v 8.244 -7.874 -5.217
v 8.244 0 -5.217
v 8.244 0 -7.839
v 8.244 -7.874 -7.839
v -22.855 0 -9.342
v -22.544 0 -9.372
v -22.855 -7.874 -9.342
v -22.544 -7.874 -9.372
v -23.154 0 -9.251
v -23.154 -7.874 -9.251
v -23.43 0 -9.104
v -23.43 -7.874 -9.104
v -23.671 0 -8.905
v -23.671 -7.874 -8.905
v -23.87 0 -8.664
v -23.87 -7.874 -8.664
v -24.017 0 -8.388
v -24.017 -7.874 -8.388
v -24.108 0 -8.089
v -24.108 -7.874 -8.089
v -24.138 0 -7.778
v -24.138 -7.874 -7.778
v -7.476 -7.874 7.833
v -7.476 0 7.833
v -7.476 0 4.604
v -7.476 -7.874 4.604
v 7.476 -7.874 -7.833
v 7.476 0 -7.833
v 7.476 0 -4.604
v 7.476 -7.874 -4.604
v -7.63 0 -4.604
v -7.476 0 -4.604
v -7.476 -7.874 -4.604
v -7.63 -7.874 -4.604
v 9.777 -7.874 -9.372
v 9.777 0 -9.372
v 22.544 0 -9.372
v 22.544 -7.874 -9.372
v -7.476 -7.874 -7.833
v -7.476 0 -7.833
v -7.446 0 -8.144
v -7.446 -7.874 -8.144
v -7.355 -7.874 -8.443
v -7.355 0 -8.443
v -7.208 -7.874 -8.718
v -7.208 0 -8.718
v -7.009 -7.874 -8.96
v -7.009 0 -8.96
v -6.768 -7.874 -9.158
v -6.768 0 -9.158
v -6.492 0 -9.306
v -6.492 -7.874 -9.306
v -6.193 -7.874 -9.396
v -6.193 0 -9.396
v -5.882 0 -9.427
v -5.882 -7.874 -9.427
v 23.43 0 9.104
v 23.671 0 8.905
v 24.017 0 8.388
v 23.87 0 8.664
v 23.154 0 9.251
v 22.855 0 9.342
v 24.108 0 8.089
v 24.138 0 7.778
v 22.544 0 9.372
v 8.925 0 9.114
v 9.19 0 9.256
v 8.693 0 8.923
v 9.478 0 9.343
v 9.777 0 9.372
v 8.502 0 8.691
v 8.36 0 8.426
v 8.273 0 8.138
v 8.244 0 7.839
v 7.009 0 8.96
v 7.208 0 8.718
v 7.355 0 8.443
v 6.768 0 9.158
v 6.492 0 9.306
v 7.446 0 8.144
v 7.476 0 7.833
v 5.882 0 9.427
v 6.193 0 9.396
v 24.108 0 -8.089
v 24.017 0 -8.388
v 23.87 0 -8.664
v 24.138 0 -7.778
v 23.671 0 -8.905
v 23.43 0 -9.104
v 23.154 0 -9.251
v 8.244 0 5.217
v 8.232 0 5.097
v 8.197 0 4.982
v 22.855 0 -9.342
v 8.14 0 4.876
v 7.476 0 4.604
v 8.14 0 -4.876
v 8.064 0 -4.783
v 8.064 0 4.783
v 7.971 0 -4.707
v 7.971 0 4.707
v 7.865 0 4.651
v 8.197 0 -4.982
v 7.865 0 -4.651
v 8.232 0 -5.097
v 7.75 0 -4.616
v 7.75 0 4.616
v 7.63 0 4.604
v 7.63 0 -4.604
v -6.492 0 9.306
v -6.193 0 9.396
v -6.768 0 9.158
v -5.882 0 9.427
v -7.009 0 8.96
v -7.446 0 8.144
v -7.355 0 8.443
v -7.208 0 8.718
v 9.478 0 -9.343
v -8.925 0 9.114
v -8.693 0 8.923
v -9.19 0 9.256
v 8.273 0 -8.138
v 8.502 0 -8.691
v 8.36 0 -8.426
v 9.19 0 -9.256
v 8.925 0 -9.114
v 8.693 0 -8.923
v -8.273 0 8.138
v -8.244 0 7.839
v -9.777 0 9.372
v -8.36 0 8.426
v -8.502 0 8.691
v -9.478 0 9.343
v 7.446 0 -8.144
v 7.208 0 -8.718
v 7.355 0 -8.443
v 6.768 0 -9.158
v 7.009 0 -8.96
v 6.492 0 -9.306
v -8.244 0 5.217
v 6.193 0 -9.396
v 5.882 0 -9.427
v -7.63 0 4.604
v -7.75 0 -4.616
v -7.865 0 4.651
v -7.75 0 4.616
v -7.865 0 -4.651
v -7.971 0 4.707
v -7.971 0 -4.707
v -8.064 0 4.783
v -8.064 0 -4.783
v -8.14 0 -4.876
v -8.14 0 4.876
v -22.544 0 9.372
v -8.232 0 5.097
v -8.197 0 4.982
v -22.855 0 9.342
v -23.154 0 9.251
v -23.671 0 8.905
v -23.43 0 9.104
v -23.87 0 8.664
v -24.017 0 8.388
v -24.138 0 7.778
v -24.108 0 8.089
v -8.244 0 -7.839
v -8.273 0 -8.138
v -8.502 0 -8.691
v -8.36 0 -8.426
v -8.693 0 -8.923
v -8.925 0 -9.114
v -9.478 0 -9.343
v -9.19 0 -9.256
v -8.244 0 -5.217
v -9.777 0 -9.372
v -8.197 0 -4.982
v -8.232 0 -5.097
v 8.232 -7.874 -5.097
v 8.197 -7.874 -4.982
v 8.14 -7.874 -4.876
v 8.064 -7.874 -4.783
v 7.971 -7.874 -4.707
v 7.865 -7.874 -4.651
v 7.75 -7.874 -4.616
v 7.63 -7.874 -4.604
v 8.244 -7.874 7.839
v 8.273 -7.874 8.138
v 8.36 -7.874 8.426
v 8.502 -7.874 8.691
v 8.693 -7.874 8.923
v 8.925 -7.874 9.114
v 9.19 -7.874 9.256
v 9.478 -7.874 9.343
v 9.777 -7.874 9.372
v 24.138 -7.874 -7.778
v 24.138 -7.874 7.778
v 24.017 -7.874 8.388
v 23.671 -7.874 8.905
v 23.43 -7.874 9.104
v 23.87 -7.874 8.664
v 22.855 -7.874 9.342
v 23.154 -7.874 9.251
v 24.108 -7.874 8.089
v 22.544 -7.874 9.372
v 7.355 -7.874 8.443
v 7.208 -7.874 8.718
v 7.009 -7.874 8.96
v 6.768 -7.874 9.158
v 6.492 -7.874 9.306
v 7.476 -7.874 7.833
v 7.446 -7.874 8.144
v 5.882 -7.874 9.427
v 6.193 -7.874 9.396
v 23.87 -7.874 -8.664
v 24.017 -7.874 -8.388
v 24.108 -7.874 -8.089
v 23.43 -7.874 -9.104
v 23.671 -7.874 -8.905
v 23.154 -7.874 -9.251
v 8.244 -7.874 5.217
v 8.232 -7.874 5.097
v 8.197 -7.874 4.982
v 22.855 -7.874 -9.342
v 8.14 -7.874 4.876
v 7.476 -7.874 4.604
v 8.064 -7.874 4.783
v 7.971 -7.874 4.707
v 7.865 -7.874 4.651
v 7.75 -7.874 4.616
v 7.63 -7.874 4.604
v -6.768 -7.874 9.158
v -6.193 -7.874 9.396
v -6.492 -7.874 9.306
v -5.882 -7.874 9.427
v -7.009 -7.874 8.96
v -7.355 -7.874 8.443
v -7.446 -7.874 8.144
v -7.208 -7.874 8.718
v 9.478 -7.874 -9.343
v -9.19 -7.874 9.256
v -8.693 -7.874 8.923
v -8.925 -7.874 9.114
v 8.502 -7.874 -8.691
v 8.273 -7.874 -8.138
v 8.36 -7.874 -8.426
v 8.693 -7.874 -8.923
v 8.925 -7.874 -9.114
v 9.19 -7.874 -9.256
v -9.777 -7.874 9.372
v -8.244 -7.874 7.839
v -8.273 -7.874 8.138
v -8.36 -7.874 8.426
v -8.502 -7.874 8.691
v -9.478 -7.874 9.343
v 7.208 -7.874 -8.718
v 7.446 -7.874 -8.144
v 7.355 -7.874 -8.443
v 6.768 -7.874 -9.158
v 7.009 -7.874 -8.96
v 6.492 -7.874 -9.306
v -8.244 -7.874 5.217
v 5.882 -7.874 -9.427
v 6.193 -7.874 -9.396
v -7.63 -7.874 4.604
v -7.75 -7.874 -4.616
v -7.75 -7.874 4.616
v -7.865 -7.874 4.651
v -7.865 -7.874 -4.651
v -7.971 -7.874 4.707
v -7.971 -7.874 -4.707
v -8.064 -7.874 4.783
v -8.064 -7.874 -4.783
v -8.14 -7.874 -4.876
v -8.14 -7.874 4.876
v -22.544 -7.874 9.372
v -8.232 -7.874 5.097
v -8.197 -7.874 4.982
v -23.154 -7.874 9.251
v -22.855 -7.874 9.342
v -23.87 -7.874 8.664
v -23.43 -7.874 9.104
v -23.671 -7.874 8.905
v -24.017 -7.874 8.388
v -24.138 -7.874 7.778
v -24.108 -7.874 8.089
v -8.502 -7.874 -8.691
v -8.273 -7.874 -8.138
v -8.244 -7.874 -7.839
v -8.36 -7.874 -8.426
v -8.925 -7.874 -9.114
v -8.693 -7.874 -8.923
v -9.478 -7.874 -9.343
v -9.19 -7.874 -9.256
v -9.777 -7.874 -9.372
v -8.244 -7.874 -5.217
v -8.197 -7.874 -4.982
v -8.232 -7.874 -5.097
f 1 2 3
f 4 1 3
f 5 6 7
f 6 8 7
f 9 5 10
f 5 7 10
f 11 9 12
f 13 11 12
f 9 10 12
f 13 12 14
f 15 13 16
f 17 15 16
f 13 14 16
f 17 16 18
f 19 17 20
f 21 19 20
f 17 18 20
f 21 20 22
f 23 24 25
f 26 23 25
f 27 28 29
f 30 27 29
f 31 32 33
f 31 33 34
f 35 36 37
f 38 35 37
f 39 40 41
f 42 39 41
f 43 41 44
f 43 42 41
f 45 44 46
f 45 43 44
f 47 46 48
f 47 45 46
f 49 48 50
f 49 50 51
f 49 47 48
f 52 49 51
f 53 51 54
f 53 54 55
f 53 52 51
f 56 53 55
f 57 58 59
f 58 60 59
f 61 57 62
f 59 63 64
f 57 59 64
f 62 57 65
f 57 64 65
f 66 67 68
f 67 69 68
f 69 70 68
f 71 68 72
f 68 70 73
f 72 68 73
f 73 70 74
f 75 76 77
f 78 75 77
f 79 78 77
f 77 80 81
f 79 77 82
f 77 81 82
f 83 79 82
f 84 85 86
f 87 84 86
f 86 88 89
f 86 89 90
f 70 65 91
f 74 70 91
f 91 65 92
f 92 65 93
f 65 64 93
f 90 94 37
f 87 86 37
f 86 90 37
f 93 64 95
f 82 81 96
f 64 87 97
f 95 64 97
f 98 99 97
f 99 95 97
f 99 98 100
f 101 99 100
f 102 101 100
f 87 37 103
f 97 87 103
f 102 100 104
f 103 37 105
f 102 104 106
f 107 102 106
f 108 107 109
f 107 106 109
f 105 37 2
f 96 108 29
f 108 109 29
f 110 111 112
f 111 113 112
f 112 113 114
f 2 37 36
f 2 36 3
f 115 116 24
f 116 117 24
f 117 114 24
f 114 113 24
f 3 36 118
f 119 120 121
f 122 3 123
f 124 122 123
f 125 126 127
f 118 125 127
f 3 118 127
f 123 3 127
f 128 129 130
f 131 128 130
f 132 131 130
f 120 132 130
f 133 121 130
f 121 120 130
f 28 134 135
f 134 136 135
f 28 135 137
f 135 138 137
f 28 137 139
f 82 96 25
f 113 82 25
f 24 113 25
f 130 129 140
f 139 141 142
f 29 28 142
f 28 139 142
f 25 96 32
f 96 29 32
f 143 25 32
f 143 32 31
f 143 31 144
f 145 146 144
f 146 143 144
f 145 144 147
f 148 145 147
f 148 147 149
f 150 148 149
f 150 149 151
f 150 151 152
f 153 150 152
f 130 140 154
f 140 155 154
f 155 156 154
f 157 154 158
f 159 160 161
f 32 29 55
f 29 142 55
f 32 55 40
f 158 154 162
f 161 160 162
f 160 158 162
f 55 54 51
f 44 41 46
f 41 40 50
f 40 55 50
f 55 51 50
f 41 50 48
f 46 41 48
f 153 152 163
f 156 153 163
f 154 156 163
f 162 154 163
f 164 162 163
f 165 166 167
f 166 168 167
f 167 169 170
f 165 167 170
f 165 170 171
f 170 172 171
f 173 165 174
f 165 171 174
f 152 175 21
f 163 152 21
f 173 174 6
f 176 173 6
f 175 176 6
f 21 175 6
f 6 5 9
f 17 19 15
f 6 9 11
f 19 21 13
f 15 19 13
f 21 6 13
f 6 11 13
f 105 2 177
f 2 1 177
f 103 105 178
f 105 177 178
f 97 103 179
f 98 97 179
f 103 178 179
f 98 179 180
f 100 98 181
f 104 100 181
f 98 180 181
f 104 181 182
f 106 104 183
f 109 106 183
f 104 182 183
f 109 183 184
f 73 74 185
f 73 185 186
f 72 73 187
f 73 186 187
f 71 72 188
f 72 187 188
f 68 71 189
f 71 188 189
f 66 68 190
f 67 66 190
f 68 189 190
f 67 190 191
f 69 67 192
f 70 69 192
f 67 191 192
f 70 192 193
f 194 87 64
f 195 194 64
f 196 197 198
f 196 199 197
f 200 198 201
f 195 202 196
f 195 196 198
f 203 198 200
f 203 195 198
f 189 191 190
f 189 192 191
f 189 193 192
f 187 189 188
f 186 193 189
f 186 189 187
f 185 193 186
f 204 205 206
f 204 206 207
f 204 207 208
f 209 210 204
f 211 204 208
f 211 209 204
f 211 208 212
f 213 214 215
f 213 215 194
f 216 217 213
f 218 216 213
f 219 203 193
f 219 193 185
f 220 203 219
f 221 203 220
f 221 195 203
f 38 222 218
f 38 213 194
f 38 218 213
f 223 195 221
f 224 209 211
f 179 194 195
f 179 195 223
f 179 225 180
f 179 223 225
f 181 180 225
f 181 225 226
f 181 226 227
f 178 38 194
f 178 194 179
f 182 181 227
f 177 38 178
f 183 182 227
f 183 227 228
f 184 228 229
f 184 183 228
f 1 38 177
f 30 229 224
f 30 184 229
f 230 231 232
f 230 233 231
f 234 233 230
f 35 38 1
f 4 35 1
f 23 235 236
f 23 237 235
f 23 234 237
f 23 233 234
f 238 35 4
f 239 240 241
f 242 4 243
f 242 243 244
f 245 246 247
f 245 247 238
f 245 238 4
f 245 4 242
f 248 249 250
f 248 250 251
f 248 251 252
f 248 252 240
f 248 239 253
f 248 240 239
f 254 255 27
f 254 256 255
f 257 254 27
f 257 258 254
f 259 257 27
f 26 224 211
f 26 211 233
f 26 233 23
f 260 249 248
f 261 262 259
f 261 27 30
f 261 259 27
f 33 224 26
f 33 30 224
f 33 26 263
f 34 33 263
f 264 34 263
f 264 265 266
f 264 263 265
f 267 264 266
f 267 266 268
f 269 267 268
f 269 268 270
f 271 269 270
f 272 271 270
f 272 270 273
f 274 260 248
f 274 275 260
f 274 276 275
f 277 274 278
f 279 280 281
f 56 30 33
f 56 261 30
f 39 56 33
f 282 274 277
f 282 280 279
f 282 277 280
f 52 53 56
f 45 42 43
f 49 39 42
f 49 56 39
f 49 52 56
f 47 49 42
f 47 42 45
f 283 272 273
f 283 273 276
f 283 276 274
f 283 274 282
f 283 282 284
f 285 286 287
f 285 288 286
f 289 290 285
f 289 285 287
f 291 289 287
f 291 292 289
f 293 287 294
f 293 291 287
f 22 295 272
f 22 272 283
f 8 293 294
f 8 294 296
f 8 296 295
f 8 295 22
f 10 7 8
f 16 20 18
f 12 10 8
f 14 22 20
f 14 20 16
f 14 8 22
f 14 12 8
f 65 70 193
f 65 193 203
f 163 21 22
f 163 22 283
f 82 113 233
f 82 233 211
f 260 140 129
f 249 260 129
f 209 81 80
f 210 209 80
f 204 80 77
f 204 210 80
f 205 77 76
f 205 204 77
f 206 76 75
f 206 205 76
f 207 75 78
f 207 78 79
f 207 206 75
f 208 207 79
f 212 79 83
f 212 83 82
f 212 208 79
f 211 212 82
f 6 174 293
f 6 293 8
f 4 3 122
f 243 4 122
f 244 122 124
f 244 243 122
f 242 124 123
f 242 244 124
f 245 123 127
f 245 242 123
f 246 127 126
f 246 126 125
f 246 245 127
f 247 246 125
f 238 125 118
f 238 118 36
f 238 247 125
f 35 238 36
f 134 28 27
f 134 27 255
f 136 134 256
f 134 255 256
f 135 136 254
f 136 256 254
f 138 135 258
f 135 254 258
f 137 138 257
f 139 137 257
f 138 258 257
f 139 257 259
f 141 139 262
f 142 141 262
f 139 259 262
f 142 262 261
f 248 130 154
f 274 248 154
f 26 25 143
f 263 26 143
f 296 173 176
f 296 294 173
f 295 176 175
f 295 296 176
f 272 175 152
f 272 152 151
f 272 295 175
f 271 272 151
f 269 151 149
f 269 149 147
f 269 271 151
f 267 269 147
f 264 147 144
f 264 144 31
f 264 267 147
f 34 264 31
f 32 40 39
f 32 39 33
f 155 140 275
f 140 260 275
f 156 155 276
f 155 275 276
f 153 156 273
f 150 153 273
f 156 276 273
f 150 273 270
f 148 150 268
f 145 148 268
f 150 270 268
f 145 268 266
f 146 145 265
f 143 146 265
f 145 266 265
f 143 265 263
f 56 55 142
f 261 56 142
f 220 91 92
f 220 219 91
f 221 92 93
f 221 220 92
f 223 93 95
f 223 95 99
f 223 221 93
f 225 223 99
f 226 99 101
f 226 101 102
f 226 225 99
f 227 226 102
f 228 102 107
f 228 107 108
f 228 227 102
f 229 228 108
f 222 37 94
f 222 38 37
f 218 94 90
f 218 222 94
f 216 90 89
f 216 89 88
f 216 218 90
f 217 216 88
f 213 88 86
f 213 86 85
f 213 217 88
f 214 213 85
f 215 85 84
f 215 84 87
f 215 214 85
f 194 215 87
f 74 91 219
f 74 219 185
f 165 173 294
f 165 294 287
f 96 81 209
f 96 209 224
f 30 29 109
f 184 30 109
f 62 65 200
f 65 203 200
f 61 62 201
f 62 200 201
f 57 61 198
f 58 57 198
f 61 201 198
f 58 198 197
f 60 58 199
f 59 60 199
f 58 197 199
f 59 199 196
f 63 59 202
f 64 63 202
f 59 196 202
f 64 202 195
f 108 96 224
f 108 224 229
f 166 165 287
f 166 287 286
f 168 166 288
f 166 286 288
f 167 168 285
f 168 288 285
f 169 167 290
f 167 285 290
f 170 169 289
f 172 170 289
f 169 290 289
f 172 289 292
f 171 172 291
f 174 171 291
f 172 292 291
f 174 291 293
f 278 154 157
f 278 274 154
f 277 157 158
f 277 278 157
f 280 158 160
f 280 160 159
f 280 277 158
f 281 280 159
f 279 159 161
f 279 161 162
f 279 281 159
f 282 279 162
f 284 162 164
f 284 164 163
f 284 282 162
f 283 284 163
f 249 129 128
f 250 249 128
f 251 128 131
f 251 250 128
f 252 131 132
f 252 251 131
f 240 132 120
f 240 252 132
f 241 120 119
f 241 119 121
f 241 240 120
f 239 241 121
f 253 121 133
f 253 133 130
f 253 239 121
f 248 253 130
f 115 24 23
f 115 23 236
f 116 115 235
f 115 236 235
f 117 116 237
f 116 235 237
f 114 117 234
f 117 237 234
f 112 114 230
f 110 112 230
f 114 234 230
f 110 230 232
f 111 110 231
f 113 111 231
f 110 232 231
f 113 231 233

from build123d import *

# Parameters (mm, degrees)
F1_DEPTH = 7.874
F2_R     = 1.533026
F3_R     = 1.594347
F4_R     = 0.61321


with BuildPart() as f1:
    # F0 (on Front) → F1 (new body)
    with BuildSketch(Plane.XZ):
        Polygon((-7.47635, 9.42706), (-7.47635, 4.603866), (-8.243676, 4.603866), (-8.243676, 9.372251), (-24.138292, 9.372251), (-24.138292, 0), (0, 0), (0, 9.42706), align=None)
    extrude(amount=F1_DEPTH)

    # F2
    f2_edges = [f1.edges().sort_by_distance(p)[0] for p in [
        (-8.243676, -3.937, 9.372251),
    ]]
    fillet(f2_edges, radius=F2_R)

    # F3
    f3_edges = [f1.edges().sort_by_distance(p)[0] for p in [
        (-24.138292, -3.937, 9.372251),
        (-7.47635, -3.937, 9.42706),
    ]]
    fillet(f3_edges, radius=F3_R)

    # F4
    f4_edges = [f1.edges().sort_by_distance(p)[0] for p in [
        (-8.243676, -3.937, 4.603866),
    ]]
    fillet(f4_edges, radius=F4_R)

    # F5: F1 across face


with BuildPart() as f1_1:
    add(f1.part)
    add(f1.part.mirror(Plane(origin=(0, -3.937, 4.71353), x_dir=(0, 1, 0), z_dir=(1, 0, 0))))

    # F6: F1 across face


with BuildPart() as f1_2:
    add(f1_1.part)
    add(f1_1.part.mirror(Plane(origin=(0, -3.937, 0), x_dir=(1, 0, 0), z_dir=(0, 0, -1))))


solid = f1_2.part
